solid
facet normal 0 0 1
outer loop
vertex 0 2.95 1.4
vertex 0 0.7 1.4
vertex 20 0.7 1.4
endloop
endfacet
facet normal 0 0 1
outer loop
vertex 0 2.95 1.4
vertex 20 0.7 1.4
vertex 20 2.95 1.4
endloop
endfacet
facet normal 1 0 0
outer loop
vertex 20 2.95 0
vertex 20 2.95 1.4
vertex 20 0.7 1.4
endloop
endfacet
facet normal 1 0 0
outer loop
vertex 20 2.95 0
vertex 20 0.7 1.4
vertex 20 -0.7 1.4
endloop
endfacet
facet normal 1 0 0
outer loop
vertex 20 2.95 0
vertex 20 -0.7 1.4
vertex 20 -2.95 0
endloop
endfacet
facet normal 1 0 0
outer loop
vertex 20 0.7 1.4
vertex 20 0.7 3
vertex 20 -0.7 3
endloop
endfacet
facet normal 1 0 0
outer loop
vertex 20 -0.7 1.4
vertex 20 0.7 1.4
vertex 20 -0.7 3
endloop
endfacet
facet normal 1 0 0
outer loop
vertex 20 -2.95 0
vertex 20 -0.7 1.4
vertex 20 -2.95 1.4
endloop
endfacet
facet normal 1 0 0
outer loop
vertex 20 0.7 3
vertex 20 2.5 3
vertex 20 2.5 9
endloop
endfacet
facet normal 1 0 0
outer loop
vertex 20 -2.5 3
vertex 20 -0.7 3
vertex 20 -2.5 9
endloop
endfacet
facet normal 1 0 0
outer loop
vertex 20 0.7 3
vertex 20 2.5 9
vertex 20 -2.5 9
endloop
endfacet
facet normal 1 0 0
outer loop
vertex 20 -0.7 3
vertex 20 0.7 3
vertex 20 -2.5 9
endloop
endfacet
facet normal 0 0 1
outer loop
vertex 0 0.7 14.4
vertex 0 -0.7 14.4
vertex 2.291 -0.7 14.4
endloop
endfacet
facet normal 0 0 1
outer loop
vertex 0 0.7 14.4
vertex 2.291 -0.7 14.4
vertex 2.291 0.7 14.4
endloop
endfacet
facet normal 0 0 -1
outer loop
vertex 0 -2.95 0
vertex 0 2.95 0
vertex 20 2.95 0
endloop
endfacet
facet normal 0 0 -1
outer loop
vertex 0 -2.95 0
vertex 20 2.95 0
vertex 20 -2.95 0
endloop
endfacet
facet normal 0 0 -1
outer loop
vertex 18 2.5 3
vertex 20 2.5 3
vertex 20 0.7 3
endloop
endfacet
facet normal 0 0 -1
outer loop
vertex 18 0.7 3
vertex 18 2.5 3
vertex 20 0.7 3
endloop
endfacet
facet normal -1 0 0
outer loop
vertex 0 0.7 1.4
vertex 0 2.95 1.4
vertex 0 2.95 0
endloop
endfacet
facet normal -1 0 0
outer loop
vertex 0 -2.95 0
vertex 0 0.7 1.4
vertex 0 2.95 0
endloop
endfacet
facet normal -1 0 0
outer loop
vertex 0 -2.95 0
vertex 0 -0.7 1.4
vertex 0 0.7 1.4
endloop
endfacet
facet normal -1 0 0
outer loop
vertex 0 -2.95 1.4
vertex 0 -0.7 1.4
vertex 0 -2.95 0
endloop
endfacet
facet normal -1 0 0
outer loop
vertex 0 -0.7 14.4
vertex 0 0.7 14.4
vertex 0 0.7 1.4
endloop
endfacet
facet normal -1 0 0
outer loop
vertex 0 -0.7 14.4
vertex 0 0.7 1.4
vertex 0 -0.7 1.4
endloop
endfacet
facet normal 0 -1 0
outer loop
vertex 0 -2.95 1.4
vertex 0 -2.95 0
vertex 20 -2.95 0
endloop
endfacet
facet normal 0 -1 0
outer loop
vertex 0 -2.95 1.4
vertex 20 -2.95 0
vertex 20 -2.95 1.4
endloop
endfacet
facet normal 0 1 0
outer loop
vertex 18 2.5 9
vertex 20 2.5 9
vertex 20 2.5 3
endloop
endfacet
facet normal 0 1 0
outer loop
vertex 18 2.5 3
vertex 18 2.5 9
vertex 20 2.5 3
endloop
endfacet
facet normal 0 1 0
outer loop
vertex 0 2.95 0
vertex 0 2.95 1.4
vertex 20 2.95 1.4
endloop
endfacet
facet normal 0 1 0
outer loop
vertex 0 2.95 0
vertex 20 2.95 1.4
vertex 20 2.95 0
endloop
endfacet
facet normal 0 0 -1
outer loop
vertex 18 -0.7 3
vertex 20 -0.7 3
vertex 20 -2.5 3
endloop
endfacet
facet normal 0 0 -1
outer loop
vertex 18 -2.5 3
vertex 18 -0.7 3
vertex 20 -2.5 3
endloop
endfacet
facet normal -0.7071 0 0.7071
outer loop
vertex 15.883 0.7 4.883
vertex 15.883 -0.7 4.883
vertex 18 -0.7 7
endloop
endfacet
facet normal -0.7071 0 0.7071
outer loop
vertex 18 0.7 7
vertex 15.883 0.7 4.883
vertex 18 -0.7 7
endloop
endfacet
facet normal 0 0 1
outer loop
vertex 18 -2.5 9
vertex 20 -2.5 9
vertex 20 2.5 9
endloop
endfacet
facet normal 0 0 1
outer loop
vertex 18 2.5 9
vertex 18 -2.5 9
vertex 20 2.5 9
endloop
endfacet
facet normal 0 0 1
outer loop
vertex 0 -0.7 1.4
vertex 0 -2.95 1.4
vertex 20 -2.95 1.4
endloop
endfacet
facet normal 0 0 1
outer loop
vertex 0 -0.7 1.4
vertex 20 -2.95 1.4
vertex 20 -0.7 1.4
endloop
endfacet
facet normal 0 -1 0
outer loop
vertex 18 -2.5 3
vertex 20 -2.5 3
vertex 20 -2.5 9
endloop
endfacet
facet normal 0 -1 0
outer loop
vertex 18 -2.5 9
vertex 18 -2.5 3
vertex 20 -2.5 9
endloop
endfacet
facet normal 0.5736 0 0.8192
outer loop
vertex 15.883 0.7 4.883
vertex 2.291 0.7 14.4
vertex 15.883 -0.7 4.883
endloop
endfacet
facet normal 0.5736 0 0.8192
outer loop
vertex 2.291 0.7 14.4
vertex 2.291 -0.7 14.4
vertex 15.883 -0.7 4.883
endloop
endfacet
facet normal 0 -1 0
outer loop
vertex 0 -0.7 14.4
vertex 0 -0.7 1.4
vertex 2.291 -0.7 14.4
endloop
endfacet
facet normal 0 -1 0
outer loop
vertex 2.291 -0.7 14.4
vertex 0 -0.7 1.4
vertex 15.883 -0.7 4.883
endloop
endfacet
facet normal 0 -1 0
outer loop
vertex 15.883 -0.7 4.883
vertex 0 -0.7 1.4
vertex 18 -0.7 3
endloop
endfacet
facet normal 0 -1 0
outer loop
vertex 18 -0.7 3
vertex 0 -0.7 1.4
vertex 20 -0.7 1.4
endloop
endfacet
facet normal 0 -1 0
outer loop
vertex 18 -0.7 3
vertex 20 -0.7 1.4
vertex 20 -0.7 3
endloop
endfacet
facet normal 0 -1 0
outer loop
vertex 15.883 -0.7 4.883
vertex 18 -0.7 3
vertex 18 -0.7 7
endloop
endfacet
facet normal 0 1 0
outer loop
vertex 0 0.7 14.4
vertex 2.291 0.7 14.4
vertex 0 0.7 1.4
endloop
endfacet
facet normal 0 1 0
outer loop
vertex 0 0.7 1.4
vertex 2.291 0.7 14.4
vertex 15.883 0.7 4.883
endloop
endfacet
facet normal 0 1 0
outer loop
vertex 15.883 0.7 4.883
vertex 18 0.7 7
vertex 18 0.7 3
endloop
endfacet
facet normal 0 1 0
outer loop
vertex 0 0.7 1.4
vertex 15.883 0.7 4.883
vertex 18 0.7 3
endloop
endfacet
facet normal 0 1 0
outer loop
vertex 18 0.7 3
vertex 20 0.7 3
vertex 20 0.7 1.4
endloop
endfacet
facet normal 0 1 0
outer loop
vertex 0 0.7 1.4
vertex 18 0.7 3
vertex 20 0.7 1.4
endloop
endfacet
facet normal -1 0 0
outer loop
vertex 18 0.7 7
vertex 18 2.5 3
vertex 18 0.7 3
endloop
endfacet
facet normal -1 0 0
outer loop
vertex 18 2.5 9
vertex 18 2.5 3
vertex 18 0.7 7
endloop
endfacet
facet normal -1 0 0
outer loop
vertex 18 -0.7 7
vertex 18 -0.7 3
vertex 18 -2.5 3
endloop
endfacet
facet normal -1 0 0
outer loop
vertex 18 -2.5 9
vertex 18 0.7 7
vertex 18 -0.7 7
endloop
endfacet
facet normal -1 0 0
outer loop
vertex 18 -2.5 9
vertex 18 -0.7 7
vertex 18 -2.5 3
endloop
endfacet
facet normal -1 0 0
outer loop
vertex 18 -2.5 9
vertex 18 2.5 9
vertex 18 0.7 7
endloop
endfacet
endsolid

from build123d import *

# Parameters (mm, degrees)
PAD_DEPTH         = 20
POCKET_DEPTH      = 2.951
POCKET_DEPTH_BACK = -2.951
PAD001_DEPTH      = 2
PAD002_DEPTH      = 0.7


with BuildPart() as part:
    # Sketch → Pad (new body)
    with BuildSketch(Plane.YZ):
        Polygon((-2.95, 0), (-2.95, 1.4), (-0.7, 1.4), (-0.7, 14.4), (0.7, 14.4), (0.7, 1.4), (2.95, 1.4), (2.95, 0), align=None)
    extrude(amount=PAD_DEPTH)

    # Sketch002 → Pocket (cut, two sides)
    with BuildSketch(Plane.XZ) as pocket_sk:
        Polygon((20, 14.4), (2.290965, 14.4), (20, 2), align=None)
    extrude(amount=-POCKET_DEPTH, mode=Mode.SUBTRACT)
    extrude(pocket_sk.sketch, amount=-POCKET_DEPTH_BACK, mode=Mode.SUBTRACT)

    # Sketch001 (on DatumPlane) → Pad001 (join)
    with BuildSketch(Plane.YZ.offset(20)):
        Polygon((-2.5, 9), (2.5, 9), (2.5, 3), (0.7, 3), (0.7, 1.4), (-0.7, 1.4), (-0.7, 3), (-2.5, 3), align=None)
    extrude(amount=-PAD001_DEPTH)

    # Sketch003 → Pad002 (join, symmetric)
    with BuildSketch(Plane.XZ):
        Polygon((20, 3), (14, 3), (20, 9), align=None)
    extrude(amount=PAD002_DEPTH, both=True)


solid = part.part
